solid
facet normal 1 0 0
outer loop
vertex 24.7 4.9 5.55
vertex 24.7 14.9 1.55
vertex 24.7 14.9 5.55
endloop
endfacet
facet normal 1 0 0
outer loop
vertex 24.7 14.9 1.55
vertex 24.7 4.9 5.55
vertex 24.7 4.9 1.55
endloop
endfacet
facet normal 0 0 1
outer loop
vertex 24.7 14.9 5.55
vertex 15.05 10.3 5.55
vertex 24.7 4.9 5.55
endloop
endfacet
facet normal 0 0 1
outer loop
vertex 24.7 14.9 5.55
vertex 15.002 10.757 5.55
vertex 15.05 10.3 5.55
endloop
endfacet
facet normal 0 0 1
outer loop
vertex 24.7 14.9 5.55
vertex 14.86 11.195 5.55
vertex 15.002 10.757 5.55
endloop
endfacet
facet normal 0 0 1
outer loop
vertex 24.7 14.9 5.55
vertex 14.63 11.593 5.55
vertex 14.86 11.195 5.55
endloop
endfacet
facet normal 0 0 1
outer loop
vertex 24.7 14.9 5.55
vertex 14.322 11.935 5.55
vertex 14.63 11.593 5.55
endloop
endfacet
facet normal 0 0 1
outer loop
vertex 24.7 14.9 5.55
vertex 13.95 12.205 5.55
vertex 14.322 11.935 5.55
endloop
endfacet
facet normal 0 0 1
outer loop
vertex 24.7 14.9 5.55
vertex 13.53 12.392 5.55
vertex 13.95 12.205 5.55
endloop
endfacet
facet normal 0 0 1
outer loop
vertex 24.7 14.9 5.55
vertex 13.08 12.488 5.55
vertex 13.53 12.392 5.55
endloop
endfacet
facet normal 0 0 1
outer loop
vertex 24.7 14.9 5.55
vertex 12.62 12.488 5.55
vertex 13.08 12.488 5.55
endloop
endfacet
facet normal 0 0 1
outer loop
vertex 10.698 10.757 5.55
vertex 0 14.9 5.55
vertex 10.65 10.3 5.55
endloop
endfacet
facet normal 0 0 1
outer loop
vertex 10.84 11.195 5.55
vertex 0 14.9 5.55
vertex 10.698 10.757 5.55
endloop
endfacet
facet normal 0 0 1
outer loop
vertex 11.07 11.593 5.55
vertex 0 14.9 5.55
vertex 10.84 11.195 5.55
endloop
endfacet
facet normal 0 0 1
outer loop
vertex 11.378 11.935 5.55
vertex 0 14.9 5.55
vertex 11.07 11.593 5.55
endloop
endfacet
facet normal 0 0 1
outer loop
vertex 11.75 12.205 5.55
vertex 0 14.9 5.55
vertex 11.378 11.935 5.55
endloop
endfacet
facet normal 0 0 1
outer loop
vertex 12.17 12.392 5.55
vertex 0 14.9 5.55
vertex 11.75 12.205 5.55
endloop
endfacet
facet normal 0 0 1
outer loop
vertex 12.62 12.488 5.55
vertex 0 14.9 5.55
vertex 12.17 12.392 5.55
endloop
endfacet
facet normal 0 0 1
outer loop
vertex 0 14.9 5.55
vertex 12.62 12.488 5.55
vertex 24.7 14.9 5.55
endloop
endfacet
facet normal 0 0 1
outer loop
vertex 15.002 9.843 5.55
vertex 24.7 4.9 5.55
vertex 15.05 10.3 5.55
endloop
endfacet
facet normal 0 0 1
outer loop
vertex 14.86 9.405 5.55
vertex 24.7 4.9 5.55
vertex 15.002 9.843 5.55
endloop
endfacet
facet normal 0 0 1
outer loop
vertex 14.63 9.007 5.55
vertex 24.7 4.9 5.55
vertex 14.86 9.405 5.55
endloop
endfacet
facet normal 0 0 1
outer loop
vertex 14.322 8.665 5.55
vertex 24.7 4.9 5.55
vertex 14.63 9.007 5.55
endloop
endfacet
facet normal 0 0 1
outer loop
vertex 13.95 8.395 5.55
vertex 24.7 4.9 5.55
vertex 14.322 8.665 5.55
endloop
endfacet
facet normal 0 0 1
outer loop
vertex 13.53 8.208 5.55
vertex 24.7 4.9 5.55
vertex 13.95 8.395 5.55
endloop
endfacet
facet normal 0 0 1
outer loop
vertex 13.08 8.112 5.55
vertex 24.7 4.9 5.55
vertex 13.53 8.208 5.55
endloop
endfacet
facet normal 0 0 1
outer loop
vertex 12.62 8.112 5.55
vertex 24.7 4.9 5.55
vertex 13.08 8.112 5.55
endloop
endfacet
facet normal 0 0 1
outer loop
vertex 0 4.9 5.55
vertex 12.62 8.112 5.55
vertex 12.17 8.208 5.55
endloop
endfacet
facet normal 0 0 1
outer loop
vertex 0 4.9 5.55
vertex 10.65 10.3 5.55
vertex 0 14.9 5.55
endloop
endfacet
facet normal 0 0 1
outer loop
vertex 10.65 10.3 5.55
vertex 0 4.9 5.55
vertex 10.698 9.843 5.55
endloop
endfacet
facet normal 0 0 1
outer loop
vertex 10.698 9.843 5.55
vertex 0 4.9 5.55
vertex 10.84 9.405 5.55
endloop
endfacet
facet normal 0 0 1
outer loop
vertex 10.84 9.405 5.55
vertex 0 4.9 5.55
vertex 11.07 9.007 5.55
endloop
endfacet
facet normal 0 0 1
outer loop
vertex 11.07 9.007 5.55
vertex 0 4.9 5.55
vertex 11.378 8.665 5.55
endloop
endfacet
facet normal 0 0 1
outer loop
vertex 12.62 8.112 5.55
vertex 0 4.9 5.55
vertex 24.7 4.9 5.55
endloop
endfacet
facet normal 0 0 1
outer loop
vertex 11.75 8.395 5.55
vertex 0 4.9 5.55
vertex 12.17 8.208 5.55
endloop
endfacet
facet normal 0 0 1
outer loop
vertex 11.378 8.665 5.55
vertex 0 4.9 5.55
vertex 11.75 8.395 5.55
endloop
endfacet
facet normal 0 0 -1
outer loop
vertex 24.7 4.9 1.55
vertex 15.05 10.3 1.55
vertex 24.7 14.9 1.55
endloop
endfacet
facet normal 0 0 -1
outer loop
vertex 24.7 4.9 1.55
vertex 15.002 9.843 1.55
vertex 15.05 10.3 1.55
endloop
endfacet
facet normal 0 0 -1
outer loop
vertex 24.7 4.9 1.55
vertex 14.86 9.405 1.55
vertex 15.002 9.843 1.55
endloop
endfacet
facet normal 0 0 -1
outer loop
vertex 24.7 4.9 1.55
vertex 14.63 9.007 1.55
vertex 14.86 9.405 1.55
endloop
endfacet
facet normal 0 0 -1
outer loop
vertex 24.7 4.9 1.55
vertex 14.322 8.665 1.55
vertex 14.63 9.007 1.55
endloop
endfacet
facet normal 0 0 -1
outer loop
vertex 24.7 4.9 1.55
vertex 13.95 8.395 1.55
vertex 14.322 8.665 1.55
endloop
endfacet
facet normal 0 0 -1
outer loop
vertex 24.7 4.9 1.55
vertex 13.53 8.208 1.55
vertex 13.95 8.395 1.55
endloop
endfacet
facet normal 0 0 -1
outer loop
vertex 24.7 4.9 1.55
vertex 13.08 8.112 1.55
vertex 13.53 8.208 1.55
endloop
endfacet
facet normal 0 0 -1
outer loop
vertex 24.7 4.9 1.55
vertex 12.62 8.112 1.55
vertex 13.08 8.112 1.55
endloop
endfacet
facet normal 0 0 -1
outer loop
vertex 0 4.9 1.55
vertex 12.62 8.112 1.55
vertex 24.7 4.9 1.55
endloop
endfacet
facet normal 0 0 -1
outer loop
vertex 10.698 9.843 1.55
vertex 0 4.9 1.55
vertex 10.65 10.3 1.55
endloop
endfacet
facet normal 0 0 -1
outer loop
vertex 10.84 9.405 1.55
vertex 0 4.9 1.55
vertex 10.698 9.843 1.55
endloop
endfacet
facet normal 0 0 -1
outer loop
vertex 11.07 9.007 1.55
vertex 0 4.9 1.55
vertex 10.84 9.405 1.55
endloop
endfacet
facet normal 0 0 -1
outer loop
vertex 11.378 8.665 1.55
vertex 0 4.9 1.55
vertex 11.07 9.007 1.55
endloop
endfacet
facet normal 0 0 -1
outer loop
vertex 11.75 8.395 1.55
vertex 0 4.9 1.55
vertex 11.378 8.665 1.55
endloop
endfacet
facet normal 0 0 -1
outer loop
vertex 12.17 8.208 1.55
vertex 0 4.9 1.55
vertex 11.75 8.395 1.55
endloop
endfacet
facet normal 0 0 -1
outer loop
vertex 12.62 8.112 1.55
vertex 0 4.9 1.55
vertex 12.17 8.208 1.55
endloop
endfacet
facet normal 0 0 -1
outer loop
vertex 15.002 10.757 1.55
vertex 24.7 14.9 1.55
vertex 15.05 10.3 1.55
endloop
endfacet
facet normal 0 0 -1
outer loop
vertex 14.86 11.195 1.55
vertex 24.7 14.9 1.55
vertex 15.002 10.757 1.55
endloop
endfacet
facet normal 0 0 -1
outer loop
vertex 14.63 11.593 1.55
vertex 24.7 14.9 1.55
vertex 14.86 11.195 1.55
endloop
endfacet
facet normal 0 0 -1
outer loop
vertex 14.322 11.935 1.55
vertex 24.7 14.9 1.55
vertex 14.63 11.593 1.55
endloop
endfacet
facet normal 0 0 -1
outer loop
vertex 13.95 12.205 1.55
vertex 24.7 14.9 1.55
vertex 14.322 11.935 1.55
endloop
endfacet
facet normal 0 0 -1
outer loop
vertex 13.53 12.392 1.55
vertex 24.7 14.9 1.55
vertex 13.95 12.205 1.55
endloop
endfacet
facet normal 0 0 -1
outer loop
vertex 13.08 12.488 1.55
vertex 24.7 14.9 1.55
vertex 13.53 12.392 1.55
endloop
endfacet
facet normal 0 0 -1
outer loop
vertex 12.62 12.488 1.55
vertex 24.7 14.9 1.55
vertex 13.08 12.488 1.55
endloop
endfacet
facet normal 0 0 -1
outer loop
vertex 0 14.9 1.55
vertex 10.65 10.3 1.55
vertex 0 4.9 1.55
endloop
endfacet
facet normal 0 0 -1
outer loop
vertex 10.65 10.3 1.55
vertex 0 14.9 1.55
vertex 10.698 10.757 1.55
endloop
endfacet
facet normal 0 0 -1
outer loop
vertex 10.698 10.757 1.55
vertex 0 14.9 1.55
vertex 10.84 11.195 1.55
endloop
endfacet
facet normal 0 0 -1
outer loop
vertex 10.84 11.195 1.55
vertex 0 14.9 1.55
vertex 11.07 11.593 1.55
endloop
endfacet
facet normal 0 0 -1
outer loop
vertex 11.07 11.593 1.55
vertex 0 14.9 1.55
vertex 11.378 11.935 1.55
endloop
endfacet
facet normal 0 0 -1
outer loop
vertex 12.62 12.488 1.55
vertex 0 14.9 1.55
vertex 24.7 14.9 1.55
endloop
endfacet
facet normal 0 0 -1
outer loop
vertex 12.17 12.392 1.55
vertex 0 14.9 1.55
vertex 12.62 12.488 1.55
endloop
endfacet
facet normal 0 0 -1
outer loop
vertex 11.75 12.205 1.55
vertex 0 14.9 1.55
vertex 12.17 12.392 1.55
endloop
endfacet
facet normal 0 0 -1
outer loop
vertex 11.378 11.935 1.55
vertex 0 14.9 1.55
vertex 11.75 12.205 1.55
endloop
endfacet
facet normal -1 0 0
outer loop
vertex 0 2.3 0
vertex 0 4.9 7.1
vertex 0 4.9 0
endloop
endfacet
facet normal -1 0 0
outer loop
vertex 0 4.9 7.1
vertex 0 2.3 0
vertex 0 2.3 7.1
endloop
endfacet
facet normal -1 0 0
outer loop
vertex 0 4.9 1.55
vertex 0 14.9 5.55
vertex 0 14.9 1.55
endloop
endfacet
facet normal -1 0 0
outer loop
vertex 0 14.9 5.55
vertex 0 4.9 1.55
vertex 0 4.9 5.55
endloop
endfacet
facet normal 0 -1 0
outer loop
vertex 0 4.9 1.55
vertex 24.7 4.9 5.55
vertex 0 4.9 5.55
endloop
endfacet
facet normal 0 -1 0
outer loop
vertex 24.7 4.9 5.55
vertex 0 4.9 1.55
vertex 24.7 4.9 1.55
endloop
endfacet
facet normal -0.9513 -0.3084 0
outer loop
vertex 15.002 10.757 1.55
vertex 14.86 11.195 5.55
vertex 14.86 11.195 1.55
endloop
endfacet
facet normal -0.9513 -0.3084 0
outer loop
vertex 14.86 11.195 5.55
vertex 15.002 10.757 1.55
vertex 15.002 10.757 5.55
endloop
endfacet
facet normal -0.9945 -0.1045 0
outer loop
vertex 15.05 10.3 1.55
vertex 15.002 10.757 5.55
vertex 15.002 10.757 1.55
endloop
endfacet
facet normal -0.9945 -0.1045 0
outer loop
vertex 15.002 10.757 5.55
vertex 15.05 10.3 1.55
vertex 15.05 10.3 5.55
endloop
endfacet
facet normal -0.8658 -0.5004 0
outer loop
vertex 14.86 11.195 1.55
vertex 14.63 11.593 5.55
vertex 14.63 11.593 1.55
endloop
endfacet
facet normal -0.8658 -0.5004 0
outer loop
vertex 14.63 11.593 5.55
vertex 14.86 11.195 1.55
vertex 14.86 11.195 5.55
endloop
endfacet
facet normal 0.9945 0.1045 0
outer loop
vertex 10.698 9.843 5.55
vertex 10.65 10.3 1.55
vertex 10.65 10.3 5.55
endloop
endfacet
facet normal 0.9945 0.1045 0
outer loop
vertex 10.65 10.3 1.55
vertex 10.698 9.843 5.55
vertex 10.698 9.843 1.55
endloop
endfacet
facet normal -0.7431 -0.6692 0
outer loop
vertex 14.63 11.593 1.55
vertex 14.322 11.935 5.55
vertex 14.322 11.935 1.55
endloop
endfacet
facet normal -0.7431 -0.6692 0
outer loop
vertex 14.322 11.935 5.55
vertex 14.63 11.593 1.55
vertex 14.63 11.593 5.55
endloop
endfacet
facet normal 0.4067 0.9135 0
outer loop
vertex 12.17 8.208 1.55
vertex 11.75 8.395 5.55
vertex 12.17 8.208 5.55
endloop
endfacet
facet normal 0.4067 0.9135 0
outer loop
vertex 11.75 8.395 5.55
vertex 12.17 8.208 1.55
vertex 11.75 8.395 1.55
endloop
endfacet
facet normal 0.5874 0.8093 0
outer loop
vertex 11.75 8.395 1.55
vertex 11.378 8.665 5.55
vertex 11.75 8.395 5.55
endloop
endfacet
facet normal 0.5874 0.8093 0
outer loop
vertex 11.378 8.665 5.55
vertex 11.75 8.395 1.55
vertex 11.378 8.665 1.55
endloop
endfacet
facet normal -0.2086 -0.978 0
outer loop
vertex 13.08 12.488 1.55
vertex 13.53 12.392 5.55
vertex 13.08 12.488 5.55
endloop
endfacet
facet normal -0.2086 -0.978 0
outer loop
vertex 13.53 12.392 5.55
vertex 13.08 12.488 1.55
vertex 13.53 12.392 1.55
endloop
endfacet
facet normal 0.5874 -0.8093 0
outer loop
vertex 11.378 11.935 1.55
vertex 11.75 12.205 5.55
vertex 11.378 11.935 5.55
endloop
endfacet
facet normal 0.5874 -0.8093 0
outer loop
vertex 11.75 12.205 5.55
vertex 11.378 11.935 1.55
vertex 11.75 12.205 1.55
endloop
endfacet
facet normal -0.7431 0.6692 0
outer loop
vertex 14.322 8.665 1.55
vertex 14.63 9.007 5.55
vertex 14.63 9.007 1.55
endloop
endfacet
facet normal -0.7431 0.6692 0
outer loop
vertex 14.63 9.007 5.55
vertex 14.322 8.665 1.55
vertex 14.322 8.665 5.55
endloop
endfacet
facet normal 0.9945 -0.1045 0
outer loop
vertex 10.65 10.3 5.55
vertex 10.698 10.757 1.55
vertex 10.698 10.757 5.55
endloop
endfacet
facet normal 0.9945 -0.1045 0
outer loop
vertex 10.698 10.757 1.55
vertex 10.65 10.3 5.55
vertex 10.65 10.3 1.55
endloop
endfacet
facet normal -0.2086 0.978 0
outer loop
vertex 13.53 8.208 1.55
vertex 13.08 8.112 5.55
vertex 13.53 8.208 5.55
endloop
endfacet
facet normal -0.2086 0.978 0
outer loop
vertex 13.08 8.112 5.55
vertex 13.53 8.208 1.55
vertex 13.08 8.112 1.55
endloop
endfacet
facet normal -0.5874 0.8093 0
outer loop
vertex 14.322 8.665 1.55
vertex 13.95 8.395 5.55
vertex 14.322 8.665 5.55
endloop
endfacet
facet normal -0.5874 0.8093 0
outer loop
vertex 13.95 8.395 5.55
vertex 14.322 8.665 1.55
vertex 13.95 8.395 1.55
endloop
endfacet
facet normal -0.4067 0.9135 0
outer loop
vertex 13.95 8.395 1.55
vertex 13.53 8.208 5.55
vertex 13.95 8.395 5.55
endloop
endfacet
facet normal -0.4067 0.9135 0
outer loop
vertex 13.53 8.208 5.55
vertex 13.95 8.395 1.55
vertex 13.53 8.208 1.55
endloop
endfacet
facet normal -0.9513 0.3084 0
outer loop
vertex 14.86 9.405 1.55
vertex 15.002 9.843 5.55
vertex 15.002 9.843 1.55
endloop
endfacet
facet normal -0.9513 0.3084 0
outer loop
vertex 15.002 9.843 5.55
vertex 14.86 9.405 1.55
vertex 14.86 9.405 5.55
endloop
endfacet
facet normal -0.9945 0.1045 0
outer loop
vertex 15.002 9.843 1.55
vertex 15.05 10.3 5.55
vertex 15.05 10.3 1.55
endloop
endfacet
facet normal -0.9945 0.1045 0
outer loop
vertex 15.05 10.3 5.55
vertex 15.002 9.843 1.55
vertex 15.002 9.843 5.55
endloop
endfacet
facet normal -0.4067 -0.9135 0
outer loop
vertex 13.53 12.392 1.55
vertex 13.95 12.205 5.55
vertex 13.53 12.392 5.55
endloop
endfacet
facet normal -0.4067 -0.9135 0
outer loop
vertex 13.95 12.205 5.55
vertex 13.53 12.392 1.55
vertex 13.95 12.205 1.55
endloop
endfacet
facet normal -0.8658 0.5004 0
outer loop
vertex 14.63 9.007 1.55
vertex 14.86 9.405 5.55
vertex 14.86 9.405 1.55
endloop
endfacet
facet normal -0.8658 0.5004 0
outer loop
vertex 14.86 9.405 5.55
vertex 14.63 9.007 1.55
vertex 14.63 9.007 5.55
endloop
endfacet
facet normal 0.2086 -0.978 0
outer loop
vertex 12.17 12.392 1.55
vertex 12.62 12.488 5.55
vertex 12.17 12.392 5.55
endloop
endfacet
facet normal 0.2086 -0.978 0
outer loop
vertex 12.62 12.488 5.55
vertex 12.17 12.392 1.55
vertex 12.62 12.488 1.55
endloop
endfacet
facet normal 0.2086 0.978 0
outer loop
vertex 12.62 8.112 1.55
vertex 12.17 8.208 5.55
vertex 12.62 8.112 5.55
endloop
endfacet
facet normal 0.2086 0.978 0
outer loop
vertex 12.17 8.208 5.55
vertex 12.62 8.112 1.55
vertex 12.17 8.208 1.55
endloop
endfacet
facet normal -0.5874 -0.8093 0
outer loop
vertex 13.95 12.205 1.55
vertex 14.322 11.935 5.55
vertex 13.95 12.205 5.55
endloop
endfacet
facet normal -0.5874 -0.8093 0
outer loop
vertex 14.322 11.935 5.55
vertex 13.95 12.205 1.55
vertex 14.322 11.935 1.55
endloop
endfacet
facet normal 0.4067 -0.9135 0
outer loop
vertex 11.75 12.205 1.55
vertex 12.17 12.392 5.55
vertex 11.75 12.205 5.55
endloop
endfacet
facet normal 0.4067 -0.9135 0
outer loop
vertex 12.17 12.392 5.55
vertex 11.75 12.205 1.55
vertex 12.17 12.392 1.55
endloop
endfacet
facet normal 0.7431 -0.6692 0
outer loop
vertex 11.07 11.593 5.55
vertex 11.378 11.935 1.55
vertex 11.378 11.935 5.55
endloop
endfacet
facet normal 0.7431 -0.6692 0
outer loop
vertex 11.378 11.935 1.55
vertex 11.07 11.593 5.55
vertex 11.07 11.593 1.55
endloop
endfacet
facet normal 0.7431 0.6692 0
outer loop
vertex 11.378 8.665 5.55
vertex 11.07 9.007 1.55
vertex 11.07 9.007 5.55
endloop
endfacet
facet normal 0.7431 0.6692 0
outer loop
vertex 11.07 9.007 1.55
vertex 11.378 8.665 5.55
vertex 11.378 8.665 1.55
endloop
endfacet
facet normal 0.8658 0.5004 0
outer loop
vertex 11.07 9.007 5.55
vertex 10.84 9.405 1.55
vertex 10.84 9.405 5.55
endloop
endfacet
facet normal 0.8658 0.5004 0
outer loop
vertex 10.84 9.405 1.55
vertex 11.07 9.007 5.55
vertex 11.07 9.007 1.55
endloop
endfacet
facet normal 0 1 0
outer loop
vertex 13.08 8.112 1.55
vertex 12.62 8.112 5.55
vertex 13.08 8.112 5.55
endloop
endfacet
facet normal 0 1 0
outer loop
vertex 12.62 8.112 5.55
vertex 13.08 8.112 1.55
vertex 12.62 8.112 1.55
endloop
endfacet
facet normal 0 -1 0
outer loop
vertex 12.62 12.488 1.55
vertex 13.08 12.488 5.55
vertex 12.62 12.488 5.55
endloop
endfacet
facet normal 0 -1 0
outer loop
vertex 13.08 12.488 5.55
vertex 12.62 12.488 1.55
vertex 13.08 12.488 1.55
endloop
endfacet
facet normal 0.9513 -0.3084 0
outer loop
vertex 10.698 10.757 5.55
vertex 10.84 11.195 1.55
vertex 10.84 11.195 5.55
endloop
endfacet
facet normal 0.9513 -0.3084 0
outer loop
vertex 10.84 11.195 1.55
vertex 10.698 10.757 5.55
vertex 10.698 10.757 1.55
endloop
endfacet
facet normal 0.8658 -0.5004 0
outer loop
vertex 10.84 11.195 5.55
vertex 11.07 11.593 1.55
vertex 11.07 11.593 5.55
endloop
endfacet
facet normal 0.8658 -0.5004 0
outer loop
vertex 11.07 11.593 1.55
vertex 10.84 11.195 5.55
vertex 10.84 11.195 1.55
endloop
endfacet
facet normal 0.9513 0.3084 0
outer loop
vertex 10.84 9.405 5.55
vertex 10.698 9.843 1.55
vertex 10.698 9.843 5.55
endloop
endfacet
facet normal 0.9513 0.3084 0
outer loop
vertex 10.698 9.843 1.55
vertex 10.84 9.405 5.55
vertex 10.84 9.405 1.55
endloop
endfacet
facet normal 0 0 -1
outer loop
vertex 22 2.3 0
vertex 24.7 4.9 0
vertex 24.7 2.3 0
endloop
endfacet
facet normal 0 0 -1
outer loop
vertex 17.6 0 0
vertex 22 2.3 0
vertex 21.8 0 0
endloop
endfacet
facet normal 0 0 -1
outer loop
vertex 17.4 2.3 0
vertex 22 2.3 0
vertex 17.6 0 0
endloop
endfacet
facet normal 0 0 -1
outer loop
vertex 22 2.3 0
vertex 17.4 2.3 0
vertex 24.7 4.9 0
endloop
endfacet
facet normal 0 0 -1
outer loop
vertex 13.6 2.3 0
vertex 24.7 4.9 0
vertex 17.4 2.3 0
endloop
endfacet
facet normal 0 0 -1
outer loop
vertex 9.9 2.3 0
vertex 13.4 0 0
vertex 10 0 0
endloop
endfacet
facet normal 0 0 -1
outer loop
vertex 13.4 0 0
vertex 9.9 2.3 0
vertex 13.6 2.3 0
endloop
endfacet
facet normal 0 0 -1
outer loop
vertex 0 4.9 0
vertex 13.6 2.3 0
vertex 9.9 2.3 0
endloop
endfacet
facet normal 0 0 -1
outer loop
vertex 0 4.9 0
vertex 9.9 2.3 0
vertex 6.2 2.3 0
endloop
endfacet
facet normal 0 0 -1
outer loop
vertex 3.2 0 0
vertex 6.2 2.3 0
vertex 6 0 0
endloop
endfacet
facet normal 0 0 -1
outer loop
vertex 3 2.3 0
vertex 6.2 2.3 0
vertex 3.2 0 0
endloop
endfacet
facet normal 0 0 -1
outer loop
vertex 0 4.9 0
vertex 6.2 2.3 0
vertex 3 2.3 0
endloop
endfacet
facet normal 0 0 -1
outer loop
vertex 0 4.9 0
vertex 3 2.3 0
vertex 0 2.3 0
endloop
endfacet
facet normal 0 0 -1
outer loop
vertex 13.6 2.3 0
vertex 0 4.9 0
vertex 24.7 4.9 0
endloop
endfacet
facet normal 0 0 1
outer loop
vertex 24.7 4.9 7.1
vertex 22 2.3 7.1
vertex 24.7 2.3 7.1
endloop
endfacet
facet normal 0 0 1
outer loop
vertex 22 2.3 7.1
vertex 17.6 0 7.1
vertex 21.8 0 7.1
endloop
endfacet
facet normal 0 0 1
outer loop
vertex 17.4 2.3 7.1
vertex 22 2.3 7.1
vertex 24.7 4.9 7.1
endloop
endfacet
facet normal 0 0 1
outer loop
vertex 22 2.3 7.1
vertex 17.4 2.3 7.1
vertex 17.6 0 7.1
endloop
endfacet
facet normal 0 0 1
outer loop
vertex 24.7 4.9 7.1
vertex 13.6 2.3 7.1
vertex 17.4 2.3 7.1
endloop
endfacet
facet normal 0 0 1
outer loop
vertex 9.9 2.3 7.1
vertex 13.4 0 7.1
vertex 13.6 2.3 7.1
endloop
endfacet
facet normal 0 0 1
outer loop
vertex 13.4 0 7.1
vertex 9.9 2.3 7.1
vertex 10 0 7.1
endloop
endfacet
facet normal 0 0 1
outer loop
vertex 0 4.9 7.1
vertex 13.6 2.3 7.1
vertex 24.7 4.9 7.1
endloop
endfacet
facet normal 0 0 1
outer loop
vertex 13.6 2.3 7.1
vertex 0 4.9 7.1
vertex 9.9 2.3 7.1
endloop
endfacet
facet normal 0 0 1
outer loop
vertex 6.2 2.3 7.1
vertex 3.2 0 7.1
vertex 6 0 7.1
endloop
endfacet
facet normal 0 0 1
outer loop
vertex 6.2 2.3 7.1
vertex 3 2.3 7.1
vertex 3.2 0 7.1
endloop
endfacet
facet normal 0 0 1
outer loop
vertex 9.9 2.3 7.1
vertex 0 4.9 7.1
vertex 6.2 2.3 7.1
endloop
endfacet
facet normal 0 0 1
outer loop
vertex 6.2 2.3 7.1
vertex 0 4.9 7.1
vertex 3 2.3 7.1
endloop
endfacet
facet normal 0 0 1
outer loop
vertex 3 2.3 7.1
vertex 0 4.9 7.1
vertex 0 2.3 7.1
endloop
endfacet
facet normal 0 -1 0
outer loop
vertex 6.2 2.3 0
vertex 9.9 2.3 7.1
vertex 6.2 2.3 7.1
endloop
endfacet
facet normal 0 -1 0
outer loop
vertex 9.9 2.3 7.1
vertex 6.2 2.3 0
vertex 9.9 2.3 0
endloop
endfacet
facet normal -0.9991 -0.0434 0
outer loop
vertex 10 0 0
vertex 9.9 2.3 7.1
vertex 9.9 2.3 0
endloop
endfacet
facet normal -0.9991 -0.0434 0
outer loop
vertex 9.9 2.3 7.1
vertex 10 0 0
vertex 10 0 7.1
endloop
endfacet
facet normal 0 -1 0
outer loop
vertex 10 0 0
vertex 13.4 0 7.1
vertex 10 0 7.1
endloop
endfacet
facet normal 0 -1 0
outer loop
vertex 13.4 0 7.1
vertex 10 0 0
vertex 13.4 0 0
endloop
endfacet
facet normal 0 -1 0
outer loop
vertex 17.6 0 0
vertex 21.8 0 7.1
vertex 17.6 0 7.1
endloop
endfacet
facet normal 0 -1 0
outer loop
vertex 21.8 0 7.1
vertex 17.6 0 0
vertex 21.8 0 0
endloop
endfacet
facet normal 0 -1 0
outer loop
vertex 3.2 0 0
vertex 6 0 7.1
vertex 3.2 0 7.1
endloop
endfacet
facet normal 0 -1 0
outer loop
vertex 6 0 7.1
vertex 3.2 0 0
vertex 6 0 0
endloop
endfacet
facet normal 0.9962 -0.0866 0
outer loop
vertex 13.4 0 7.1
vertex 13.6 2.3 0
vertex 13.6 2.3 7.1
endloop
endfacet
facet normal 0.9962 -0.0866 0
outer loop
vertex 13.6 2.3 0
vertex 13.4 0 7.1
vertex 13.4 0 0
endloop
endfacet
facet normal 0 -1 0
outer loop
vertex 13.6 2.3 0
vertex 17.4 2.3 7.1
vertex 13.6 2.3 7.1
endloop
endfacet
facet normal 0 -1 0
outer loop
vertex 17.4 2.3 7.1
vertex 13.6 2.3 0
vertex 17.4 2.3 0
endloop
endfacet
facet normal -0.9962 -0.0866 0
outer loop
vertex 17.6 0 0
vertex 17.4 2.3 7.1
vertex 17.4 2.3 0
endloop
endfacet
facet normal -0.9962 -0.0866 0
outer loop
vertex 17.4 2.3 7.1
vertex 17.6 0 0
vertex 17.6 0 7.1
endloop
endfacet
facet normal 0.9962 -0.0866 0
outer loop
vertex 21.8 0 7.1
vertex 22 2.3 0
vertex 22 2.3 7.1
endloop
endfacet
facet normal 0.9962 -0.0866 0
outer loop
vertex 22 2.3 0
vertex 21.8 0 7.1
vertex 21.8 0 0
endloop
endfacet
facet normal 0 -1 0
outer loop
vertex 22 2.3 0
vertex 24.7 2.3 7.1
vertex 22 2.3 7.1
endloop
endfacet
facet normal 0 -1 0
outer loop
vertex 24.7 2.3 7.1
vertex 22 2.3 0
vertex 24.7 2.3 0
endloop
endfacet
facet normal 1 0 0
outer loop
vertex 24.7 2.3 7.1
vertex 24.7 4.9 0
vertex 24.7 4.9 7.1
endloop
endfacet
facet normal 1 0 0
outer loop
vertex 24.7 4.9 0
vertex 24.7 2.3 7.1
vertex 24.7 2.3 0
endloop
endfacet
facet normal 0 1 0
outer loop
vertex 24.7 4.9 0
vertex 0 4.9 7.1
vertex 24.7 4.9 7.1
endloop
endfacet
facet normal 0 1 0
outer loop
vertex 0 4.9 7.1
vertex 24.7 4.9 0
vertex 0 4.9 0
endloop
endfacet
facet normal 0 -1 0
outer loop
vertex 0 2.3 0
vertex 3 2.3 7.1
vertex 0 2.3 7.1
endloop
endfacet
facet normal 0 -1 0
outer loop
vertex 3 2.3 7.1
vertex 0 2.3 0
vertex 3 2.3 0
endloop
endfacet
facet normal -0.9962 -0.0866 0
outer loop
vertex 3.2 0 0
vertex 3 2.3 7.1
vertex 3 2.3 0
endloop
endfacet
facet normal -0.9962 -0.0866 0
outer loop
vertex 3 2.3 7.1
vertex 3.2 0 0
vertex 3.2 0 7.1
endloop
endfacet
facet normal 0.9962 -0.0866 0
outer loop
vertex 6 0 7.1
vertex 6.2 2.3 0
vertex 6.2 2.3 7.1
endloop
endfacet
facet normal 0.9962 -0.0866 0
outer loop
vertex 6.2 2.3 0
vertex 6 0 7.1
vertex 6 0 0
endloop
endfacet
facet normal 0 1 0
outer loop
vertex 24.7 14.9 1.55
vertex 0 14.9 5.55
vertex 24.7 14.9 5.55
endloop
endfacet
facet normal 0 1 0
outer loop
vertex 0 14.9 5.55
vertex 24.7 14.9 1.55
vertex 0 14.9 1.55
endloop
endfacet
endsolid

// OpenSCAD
intersection(){
  cube([24.7,14.9,7.1]);
  union(){
    translate([0,0])
      linear_extrude(7.1,convexity=10) intersection(){
        square([24.7,4.9]);
        translate([0,4.9]) mirror([0,1])
        polygon([[0,0],[0,2.6],[3,2.6],[3.2,4.9],[6,4.9],[6.2,2.6],
  [9.9,2.6],[10,4.9],[13.4,4.9],[13.6,2.6],[17.4,2.6],[17.6,4.9],[21.8,4.9],[22,2.6],[24.7,2.6],[24.7,0]]);
      }
    translate([0,4.9])
    difference(){
      translate([0,0,1.55]) cube([24.7,10,4]);
      translate([12.85,5.4,-.01]) cylinder(d=4.4,h=7.12,$fn=30);
    }
  }
}
